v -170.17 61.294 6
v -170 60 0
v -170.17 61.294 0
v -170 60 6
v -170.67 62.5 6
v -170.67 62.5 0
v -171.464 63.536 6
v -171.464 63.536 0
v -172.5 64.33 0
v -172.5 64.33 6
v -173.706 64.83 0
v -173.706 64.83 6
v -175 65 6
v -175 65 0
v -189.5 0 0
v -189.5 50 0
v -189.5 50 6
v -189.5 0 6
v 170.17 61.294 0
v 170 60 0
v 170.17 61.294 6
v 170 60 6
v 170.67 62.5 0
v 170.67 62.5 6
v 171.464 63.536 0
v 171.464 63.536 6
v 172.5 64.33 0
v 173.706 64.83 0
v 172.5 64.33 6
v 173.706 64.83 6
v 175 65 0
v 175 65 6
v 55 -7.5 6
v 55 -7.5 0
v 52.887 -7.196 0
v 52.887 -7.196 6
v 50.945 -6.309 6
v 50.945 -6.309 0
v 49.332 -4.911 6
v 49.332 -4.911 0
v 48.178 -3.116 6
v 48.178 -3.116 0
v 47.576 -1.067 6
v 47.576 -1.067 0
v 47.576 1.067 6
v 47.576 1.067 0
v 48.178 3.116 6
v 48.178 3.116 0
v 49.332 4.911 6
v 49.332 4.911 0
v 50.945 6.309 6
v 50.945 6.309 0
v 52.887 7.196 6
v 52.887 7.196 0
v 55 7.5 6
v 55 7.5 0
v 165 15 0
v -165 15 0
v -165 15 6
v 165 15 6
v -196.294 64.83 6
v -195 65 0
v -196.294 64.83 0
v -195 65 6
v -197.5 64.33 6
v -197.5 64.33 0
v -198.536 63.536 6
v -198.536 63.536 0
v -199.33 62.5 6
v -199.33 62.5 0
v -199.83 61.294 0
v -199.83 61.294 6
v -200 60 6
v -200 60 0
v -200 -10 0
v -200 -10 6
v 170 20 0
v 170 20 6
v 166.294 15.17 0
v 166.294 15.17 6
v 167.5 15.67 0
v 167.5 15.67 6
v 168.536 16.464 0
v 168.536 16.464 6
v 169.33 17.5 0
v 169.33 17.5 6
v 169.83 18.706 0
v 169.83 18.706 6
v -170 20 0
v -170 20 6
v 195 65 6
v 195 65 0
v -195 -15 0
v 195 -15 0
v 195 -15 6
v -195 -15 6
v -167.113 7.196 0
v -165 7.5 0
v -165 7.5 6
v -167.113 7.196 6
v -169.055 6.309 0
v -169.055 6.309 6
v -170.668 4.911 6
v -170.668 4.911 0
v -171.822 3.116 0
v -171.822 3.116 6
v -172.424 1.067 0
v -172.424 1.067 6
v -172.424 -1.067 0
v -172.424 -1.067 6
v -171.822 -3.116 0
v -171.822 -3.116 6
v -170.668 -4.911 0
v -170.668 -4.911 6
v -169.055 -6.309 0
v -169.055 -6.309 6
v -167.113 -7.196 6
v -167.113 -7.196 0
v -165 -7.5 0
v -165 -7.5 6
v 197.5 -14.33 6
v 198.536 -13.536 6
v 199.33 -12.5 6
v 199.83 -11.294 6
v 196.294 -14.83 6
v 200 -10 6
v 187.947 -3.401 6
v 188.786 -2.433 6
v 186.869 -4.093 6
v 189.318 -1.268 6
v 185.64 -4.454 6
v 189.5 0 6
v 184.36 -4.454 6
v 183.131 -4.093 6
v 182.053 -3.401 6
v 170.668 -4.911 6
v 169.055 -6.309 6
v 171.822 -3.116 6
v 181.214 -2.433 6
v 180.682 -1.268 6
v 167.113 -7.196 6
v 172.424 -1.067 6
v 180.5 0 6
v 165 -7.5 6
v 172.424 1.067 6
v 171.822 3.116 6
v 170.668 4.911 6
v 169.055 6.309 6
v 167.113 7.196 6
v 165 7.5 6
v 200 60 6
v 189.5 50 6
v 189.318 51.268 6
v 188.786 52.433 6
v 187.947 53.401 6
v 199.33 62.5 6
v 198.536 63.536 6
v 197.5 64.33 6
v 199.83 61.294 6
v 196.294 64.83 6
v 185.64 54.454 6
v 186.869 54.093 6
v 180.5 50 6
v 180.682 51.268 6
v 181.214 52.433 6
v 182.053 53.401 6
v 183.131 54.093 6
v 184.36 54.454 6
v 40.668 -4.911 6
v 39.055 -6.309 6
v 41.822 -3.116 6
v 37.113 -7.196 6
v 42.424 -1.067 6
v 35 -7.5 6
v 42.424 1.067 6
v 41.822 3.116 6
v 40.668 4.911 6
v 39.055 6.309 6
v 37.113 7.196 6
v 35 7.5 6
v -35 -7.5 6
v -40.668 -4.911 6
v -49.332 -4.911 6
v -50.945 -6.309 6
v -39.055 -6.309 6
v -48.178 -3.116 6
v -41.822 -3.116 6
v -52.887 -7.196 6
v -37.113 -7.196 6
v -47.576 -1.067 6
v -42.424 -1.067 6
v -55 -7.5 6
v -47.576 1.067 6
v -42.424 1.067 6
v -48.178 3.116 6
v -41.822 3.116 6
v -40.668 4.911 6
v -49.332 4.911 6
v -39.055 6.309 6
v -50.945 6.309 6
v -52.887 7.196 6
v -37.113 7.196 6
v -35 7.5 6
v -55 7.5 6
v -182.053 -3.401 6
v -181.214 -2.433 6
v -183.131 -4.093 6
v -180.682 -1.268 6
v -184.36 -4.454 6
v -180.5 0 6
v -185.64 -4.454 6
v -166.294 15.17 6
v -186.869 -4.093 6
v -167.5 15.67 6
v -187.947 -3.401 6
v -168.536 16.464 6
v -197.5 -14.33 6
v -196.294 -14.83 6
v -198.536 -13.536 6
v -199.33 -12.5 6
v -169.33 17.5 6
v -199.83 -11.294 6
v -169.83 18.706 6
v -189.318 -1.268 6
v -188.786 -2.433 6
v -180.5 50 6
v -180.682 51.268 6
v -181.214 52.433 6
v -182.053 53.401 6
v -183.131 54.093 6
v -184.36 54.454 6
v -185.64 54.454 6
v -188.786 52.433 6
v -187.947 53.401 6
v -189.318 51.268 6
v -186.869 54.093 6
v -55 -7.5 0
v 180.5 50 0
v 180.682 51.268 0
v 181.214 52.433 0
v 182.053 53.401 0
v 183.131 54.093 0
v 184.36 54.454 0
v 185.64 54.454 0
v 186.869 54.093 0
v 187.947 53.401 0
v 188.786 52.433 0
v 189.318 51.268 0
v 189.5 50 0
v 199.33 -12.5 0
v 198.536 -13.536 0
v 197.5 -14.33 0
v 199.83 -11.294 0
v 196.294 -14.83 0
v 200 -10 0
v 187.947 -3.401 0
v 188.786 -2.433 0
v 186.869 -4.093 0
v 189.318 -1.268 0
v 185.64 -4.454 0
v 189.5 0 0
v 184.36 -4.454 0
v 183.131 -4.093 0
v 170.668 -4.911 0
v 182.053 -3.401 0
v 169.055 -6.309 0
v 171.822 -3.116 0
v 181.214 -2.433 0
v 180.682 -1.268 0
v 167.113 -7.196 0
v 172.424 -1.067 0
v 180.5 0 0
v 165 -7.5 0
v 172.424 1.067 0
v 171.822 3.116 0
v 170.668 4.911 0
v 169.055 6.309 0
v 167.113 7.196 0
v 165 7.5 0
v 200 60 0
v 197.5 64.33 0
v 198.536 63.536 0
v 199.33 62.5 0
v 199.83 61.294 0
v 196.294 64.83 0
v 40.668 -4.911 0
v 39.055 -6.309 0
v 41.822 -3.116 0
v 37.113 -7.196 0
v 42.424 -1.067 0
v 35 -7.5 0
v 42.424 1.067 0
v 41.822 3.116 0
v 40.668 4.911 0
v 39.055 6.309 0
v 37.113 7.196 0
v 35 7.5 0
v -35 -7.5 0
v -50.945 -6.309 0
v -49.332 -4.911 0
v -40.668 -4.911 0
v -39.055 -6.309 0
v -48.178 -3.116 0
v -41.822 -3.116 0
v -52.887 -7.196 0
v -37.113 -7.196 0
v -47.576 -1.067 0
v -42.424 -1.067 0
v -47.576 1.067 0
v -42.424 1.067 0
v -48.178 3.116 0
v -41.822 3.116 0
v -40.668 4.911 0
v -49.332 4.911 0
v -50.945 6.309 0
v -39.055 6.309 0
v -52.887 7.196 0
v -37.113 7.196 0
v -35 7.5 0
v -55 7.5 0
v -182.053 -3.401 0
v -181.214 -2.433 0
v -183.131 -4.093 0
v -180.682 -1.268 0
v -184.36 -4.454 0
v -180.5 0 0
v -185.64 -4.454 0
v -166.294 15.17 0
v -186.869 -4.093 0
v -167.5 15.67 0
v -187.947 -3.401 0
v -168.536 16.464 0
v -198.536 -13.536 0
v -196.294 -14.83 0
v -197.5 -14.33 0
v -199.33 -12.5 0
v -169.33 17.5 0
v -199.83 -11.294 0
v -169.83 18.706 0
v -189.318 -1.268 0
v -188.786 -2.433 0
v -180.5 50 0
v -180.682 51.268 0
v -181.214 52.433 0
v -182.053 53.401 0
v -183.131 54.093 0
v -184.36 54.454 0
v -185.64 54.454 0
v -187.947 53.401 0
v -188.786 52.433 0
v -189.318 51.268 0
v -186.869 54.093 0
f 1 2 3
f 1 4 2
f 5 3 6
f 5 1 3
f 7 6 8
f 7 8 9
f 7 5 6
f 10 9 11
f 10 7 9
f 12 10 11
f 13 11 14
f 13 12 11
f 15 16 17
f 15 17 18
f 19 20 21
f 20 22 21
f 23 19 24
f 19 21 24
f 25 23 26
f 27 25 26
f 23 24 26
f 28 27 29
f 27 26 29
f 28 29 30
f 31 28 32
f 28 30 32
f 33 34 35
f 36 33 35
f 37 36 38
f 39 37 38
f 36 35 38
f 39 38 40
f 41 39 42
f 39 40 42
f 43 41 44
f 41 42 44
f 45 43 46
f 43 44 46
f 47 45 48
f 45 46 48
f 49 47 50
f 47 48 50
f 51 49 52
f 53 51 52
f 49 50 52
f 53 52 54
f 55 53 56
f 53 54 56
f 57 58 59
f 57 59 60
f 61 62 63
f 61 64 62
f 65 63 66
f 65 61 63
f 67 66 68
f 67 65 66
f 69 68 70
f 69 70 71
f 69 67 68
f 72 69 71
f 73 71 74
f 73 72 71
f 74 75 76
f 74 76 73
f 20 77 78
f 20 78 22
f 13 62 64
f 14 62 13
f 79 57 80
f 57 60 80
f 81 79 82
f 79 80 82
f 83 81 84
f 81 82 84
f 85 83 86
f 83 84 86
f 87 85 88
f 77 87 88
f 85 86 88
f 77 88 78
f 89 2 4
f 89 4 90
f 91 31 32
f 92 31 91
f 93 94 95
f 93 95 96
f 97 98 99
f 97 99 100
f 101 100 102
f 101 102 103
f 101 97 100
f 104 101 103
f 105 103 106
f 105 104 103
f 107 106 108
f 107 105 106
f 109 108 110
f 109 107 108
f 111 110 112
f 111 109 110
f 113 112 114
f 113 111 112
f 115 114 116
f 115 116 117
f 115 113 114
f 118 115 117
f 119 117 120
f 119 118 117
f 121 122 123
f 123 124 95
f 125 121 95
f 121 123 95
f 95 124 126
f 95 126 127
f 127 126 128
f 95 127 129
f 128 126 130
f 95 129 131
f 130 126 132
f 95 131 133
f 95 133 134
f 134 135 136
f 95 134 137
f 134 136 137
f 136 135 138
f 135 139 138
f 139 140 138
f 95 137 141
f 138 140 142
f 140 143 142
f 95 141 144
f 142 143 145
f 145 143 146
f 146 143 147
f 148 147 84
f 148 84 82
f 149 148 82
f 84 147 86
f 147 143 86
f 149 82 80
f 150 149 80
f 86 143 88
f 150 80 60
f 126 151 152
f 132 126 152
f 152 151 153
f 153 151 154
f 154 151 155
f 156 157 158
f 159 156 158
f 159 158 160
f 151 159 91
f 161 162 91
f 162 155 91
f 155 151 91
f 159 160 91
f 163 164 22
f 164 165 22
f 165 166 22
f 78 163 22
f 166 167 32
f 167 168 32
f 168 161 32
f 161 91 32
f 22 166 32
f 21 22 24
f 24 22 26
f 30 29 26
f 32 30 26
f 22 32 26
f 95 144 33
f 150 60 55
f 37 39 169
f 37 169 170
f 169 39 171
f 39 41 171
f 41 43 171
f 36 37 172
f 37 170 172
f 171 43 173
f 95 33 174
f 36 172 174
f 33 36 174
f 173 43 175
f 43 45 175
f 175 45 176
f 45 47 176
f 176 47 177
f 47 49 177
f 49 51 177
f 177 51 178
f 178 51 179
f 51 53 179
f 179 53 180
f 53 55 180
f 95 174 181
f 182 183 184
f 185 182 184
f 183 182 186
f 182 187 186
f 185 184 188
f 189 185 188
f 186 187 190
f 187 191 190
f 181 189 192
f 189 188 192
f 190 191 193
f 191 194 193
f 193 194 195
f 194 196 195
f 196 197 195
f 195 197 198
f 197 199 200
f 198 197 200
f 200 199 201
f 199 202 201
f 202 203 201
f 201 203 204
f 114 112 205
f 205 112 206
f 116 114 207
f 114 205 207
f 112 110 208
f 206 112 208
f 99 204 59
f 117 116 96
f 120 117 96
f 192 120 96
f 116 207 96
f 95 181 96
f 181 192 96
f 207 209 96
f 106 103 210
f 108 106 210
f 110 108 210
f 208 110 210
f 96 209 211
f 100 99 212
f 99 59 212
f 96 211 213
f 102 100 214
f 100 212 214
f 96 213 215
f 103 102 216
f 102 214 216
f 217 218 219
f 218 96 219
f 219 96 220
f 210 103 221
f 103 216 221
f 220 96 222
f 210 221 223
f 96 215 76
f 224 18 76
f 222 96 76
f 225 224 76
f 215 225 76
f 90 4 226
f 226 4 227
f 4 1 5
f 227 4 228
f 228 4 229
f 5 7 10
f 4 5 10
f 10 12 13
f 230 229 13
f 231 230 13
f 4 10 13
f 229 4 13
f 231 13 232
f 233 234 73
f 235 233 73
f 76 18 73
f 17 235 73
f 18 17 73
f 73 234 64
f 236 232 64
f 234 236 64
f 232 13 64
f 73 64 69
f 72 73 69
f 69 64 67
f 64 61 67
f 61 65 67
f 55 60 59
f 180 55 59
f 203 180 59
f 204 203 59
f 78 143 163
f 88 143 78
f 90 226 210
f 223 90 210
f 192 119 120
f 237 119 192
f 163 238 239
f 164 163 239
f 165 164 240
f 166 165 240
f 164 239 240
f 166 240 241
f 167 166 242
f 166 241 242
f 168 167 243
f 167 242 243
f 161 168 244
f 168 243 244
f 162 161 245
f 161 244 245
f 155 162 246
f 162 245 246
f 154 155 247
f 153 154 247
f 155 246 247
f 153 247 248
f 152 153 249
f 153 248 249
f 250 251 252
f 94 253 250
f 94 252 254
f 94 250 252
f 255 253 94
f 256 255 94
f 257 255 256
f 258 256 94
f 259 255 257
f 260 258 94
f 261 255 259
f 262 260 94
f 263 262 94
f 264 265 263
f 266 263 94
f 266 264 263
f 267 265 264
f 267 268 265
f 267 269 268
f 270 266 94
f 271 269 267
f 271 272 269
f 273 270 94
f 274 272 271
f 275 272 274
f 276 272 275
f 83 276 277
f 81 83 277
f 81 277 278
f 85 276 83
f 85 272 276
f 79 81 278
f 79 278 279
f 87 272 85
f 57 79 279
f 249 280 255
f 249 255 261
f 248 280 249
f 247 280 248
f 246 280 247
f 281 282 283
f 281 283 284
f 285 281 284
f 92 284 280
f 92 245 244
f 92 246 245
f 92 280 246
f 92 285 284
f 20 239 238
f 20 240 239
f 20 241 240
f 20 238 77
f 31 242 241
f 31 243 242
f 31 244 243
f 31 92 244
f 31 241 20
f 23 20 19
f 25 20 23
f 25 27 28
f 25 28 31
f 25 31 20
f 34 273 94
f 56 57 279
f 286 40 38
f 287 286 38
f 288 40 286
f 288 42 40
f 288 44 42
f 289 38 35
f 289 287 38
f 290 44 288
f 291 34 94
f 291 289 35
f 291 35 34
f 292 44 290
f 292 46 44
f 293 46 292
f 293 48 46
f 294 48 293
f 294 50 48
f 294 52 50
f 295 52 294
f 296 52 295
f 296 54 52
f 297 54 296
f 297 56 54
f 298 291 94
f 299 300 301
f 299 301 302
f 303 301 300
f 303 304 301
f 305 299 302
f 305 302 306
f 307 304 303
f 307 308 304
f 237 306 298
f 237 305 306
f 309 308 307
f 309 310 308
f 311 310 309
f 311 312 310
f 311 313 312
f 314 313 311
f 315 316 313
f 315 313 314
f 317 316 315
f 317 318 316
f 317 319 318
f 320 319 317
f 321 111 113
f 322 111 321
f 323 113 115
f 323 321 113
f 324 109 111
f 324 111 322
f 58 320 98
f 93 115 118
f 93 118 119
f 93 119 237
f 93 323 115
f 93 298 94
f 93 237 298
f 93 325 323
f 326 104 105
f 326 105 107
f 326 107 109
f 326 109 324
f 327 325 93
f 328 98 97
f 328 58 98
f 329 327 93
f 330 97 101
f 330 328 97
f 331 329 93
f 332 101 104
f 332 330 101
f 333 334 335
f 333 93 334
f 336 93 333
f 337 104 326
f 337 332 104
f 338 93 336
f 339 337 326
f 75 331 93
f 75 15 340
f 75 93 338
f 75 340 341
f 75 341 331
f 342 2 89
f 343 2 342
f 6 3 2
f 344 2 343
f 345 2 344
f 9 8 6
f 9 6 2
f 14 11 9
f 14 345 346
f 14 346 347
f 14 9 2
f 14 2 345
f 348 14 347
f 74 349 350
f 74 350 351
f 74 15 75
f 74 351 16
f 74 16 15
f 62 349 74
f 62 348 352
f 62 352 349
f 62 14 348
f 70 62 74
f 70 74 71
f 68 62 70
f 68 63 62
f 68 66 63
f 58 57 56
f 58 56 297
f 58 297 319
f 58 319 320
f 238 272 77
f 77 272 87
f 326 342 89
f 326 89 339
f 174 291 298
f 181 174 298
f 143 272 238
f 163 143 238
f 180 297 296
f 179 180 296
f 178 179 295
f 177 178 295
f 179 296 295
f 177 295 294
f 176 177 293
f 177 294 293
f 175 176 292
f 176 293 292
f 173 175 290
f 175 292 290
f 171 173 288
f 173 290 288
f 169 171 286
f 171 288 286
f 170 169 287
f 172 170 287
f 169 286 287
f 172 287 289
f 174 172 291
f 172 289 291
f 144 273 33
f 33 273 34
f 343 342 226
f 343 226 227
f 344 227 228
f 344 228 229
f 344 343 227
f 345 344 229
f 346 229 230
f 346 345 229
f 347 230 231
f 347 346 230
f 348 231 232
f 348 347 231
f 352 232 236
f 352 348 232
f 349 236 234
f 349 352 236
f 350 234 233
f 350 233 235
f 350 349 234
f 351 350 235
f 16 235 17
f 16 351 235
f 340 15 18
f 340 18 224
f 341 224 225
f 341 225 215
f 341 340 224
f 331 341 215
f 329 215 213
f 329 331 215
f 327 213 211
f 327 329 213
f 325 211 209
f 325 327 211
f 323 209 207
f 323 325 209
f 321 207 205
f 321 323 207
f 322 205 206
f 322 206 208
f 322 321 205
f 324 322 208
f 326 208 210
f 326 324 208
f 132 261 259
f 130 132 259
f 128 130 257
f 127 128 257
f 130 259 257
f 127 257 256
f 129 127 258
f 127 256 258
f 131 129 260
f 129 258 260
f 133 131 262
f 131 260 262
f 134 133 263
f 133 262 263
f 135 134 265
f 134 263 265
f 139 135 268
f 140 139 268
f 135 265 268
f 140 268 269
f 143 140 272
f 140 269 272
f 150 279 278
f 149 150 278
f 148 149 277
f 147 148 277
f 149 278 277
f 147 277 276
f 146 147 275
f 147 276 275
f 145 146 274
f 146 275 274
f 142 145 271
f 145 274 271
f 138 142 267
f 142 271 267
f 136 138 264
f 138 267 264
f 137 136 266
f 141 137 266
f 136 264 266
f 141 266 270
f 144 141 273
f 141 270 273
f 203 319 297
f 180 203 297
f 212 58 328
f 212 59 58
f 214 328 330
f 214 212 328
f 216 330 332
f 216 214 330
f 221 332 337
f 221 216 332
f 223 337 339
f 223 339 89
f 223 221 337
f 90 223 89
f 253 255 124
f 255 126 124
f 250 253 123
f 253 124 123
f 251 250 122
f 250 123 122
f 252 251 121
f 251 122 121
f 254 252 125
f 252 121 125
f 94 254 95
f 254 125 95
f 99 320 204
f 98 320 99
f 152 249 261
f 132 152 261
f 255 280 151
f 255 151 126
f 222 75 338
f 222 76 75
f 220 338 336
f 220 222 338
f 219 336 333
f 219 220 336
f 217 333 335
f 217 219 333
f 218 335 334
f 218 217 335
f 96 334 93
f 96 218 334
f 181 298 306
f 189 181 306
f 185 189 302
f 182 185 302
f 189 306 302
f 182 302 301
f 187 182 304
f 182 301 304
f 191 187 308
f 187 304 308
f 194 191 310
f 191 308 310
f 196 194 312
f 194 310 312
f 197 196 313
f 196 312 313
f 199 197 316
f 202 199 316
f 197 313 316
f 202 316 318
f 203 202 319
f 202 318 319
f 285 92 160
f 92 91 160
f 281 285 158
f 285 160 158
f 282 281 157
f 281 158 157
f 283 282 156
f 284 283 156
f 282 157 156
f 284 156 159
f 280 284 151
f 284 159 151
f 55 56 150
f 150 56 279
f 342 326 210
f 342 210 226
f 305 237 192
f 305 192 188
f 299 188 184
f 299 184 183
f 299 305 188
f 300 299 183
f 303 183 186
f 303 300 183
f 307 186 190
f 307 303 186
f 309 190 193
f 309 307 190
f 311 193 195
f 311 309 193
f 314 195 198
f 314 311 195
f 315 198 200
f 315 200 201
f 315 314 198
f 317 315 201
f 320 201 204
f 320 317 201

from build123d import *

# Parameters (mm, degrees)
EXTRUDE_1_DEPTH = 6
FILLET_1_R      = 5


with BuildPart() as part:
    # 草图1 → 凸台-拉伸1 (new body)
    with BuildSketch(Plane.XY):
        Polygon((-170, 15), (170, 15), (170, 65), (200, 65), (200, -15), (-200, -15), (-200, 65), (-170, 65), align=None)
        with BuildLine():
            Line((-35, 7.5), (35, 7.5))
            ThreePointArc((35, 7.5), (42.5, 0), (35, -7.5))
            Line((35, -7.5), (-35, -7.5))
            ThreePointArc((-35, -7.5), (-42.5, 0), (-35, 7.5))
        make_face(mode=Mode.SUBTRACT)
        with BuildLine():
            Line((55, 7.5), (165, 7.5))
            ThreePointArc((165, 7.5), (172.5, 0), (165, -7.5))
            Line((165, -7.5), (55, -7.5))
            ThreePointArc((55, -7.5), (47.5, 0), (55, 7.5))
        make_face(mode=Mode.SUBTRACT)
        with BuildLine():
            Line((189.5, 50), (189.5, 0))
            ThreePointArc((189.5, 0), (185, -4.5), (180.5, 0))
            Line((180.5, 0), (180.5, 50))
            ThreePointArc((180.5, 50), (185, 54.5), (189.5, 50))
        make_face(mode=Mode.SUBTRACT)
        with BuildLine():
            Line((-189.5, 50), (-189.5, 0))
            ThreePointArc((-189.5, 0), (-185, -4.5), (-180.5, 0))
            Line((-180.5, 0), (-180.5, 50))
            ThreePointArc((-180.5, 50), (-185, 54.5), (-189.5, 50))
        make_face(mode=Mode.SUBTRACT)
        with BuildLine():
            Line((-55, 7.5), (-165, 7.5))
            ThreePointArc((-165, 7.5), (-172.5, 0), (-165, -7.5))
            Line((-165, -7.5), (-55, -7.5))
            ThreePointArc((-55, -7.5), (-47.5, 0), (-55, 7.5))
        make_face(mode=Mode.SUBTRACT)
    extrude(amount=EXTRUDE_1_DEPTH)

    # 圆角1
    fillet_1_edges = [part.edges().sort_by_distance(p)[0] for p in [
        (170, 65, 3),
        (200, 65, 3),
        (200, -15, 3),
        (-200, -15, 3),
        (-200, 65, 3),
        (-170, 65, 3),
        (-170, 15, 3),
        (170, 15, 3),
    ]]
    fillet(fillet_1_edges, radius=FILLET_1_R)


solid = part.part
